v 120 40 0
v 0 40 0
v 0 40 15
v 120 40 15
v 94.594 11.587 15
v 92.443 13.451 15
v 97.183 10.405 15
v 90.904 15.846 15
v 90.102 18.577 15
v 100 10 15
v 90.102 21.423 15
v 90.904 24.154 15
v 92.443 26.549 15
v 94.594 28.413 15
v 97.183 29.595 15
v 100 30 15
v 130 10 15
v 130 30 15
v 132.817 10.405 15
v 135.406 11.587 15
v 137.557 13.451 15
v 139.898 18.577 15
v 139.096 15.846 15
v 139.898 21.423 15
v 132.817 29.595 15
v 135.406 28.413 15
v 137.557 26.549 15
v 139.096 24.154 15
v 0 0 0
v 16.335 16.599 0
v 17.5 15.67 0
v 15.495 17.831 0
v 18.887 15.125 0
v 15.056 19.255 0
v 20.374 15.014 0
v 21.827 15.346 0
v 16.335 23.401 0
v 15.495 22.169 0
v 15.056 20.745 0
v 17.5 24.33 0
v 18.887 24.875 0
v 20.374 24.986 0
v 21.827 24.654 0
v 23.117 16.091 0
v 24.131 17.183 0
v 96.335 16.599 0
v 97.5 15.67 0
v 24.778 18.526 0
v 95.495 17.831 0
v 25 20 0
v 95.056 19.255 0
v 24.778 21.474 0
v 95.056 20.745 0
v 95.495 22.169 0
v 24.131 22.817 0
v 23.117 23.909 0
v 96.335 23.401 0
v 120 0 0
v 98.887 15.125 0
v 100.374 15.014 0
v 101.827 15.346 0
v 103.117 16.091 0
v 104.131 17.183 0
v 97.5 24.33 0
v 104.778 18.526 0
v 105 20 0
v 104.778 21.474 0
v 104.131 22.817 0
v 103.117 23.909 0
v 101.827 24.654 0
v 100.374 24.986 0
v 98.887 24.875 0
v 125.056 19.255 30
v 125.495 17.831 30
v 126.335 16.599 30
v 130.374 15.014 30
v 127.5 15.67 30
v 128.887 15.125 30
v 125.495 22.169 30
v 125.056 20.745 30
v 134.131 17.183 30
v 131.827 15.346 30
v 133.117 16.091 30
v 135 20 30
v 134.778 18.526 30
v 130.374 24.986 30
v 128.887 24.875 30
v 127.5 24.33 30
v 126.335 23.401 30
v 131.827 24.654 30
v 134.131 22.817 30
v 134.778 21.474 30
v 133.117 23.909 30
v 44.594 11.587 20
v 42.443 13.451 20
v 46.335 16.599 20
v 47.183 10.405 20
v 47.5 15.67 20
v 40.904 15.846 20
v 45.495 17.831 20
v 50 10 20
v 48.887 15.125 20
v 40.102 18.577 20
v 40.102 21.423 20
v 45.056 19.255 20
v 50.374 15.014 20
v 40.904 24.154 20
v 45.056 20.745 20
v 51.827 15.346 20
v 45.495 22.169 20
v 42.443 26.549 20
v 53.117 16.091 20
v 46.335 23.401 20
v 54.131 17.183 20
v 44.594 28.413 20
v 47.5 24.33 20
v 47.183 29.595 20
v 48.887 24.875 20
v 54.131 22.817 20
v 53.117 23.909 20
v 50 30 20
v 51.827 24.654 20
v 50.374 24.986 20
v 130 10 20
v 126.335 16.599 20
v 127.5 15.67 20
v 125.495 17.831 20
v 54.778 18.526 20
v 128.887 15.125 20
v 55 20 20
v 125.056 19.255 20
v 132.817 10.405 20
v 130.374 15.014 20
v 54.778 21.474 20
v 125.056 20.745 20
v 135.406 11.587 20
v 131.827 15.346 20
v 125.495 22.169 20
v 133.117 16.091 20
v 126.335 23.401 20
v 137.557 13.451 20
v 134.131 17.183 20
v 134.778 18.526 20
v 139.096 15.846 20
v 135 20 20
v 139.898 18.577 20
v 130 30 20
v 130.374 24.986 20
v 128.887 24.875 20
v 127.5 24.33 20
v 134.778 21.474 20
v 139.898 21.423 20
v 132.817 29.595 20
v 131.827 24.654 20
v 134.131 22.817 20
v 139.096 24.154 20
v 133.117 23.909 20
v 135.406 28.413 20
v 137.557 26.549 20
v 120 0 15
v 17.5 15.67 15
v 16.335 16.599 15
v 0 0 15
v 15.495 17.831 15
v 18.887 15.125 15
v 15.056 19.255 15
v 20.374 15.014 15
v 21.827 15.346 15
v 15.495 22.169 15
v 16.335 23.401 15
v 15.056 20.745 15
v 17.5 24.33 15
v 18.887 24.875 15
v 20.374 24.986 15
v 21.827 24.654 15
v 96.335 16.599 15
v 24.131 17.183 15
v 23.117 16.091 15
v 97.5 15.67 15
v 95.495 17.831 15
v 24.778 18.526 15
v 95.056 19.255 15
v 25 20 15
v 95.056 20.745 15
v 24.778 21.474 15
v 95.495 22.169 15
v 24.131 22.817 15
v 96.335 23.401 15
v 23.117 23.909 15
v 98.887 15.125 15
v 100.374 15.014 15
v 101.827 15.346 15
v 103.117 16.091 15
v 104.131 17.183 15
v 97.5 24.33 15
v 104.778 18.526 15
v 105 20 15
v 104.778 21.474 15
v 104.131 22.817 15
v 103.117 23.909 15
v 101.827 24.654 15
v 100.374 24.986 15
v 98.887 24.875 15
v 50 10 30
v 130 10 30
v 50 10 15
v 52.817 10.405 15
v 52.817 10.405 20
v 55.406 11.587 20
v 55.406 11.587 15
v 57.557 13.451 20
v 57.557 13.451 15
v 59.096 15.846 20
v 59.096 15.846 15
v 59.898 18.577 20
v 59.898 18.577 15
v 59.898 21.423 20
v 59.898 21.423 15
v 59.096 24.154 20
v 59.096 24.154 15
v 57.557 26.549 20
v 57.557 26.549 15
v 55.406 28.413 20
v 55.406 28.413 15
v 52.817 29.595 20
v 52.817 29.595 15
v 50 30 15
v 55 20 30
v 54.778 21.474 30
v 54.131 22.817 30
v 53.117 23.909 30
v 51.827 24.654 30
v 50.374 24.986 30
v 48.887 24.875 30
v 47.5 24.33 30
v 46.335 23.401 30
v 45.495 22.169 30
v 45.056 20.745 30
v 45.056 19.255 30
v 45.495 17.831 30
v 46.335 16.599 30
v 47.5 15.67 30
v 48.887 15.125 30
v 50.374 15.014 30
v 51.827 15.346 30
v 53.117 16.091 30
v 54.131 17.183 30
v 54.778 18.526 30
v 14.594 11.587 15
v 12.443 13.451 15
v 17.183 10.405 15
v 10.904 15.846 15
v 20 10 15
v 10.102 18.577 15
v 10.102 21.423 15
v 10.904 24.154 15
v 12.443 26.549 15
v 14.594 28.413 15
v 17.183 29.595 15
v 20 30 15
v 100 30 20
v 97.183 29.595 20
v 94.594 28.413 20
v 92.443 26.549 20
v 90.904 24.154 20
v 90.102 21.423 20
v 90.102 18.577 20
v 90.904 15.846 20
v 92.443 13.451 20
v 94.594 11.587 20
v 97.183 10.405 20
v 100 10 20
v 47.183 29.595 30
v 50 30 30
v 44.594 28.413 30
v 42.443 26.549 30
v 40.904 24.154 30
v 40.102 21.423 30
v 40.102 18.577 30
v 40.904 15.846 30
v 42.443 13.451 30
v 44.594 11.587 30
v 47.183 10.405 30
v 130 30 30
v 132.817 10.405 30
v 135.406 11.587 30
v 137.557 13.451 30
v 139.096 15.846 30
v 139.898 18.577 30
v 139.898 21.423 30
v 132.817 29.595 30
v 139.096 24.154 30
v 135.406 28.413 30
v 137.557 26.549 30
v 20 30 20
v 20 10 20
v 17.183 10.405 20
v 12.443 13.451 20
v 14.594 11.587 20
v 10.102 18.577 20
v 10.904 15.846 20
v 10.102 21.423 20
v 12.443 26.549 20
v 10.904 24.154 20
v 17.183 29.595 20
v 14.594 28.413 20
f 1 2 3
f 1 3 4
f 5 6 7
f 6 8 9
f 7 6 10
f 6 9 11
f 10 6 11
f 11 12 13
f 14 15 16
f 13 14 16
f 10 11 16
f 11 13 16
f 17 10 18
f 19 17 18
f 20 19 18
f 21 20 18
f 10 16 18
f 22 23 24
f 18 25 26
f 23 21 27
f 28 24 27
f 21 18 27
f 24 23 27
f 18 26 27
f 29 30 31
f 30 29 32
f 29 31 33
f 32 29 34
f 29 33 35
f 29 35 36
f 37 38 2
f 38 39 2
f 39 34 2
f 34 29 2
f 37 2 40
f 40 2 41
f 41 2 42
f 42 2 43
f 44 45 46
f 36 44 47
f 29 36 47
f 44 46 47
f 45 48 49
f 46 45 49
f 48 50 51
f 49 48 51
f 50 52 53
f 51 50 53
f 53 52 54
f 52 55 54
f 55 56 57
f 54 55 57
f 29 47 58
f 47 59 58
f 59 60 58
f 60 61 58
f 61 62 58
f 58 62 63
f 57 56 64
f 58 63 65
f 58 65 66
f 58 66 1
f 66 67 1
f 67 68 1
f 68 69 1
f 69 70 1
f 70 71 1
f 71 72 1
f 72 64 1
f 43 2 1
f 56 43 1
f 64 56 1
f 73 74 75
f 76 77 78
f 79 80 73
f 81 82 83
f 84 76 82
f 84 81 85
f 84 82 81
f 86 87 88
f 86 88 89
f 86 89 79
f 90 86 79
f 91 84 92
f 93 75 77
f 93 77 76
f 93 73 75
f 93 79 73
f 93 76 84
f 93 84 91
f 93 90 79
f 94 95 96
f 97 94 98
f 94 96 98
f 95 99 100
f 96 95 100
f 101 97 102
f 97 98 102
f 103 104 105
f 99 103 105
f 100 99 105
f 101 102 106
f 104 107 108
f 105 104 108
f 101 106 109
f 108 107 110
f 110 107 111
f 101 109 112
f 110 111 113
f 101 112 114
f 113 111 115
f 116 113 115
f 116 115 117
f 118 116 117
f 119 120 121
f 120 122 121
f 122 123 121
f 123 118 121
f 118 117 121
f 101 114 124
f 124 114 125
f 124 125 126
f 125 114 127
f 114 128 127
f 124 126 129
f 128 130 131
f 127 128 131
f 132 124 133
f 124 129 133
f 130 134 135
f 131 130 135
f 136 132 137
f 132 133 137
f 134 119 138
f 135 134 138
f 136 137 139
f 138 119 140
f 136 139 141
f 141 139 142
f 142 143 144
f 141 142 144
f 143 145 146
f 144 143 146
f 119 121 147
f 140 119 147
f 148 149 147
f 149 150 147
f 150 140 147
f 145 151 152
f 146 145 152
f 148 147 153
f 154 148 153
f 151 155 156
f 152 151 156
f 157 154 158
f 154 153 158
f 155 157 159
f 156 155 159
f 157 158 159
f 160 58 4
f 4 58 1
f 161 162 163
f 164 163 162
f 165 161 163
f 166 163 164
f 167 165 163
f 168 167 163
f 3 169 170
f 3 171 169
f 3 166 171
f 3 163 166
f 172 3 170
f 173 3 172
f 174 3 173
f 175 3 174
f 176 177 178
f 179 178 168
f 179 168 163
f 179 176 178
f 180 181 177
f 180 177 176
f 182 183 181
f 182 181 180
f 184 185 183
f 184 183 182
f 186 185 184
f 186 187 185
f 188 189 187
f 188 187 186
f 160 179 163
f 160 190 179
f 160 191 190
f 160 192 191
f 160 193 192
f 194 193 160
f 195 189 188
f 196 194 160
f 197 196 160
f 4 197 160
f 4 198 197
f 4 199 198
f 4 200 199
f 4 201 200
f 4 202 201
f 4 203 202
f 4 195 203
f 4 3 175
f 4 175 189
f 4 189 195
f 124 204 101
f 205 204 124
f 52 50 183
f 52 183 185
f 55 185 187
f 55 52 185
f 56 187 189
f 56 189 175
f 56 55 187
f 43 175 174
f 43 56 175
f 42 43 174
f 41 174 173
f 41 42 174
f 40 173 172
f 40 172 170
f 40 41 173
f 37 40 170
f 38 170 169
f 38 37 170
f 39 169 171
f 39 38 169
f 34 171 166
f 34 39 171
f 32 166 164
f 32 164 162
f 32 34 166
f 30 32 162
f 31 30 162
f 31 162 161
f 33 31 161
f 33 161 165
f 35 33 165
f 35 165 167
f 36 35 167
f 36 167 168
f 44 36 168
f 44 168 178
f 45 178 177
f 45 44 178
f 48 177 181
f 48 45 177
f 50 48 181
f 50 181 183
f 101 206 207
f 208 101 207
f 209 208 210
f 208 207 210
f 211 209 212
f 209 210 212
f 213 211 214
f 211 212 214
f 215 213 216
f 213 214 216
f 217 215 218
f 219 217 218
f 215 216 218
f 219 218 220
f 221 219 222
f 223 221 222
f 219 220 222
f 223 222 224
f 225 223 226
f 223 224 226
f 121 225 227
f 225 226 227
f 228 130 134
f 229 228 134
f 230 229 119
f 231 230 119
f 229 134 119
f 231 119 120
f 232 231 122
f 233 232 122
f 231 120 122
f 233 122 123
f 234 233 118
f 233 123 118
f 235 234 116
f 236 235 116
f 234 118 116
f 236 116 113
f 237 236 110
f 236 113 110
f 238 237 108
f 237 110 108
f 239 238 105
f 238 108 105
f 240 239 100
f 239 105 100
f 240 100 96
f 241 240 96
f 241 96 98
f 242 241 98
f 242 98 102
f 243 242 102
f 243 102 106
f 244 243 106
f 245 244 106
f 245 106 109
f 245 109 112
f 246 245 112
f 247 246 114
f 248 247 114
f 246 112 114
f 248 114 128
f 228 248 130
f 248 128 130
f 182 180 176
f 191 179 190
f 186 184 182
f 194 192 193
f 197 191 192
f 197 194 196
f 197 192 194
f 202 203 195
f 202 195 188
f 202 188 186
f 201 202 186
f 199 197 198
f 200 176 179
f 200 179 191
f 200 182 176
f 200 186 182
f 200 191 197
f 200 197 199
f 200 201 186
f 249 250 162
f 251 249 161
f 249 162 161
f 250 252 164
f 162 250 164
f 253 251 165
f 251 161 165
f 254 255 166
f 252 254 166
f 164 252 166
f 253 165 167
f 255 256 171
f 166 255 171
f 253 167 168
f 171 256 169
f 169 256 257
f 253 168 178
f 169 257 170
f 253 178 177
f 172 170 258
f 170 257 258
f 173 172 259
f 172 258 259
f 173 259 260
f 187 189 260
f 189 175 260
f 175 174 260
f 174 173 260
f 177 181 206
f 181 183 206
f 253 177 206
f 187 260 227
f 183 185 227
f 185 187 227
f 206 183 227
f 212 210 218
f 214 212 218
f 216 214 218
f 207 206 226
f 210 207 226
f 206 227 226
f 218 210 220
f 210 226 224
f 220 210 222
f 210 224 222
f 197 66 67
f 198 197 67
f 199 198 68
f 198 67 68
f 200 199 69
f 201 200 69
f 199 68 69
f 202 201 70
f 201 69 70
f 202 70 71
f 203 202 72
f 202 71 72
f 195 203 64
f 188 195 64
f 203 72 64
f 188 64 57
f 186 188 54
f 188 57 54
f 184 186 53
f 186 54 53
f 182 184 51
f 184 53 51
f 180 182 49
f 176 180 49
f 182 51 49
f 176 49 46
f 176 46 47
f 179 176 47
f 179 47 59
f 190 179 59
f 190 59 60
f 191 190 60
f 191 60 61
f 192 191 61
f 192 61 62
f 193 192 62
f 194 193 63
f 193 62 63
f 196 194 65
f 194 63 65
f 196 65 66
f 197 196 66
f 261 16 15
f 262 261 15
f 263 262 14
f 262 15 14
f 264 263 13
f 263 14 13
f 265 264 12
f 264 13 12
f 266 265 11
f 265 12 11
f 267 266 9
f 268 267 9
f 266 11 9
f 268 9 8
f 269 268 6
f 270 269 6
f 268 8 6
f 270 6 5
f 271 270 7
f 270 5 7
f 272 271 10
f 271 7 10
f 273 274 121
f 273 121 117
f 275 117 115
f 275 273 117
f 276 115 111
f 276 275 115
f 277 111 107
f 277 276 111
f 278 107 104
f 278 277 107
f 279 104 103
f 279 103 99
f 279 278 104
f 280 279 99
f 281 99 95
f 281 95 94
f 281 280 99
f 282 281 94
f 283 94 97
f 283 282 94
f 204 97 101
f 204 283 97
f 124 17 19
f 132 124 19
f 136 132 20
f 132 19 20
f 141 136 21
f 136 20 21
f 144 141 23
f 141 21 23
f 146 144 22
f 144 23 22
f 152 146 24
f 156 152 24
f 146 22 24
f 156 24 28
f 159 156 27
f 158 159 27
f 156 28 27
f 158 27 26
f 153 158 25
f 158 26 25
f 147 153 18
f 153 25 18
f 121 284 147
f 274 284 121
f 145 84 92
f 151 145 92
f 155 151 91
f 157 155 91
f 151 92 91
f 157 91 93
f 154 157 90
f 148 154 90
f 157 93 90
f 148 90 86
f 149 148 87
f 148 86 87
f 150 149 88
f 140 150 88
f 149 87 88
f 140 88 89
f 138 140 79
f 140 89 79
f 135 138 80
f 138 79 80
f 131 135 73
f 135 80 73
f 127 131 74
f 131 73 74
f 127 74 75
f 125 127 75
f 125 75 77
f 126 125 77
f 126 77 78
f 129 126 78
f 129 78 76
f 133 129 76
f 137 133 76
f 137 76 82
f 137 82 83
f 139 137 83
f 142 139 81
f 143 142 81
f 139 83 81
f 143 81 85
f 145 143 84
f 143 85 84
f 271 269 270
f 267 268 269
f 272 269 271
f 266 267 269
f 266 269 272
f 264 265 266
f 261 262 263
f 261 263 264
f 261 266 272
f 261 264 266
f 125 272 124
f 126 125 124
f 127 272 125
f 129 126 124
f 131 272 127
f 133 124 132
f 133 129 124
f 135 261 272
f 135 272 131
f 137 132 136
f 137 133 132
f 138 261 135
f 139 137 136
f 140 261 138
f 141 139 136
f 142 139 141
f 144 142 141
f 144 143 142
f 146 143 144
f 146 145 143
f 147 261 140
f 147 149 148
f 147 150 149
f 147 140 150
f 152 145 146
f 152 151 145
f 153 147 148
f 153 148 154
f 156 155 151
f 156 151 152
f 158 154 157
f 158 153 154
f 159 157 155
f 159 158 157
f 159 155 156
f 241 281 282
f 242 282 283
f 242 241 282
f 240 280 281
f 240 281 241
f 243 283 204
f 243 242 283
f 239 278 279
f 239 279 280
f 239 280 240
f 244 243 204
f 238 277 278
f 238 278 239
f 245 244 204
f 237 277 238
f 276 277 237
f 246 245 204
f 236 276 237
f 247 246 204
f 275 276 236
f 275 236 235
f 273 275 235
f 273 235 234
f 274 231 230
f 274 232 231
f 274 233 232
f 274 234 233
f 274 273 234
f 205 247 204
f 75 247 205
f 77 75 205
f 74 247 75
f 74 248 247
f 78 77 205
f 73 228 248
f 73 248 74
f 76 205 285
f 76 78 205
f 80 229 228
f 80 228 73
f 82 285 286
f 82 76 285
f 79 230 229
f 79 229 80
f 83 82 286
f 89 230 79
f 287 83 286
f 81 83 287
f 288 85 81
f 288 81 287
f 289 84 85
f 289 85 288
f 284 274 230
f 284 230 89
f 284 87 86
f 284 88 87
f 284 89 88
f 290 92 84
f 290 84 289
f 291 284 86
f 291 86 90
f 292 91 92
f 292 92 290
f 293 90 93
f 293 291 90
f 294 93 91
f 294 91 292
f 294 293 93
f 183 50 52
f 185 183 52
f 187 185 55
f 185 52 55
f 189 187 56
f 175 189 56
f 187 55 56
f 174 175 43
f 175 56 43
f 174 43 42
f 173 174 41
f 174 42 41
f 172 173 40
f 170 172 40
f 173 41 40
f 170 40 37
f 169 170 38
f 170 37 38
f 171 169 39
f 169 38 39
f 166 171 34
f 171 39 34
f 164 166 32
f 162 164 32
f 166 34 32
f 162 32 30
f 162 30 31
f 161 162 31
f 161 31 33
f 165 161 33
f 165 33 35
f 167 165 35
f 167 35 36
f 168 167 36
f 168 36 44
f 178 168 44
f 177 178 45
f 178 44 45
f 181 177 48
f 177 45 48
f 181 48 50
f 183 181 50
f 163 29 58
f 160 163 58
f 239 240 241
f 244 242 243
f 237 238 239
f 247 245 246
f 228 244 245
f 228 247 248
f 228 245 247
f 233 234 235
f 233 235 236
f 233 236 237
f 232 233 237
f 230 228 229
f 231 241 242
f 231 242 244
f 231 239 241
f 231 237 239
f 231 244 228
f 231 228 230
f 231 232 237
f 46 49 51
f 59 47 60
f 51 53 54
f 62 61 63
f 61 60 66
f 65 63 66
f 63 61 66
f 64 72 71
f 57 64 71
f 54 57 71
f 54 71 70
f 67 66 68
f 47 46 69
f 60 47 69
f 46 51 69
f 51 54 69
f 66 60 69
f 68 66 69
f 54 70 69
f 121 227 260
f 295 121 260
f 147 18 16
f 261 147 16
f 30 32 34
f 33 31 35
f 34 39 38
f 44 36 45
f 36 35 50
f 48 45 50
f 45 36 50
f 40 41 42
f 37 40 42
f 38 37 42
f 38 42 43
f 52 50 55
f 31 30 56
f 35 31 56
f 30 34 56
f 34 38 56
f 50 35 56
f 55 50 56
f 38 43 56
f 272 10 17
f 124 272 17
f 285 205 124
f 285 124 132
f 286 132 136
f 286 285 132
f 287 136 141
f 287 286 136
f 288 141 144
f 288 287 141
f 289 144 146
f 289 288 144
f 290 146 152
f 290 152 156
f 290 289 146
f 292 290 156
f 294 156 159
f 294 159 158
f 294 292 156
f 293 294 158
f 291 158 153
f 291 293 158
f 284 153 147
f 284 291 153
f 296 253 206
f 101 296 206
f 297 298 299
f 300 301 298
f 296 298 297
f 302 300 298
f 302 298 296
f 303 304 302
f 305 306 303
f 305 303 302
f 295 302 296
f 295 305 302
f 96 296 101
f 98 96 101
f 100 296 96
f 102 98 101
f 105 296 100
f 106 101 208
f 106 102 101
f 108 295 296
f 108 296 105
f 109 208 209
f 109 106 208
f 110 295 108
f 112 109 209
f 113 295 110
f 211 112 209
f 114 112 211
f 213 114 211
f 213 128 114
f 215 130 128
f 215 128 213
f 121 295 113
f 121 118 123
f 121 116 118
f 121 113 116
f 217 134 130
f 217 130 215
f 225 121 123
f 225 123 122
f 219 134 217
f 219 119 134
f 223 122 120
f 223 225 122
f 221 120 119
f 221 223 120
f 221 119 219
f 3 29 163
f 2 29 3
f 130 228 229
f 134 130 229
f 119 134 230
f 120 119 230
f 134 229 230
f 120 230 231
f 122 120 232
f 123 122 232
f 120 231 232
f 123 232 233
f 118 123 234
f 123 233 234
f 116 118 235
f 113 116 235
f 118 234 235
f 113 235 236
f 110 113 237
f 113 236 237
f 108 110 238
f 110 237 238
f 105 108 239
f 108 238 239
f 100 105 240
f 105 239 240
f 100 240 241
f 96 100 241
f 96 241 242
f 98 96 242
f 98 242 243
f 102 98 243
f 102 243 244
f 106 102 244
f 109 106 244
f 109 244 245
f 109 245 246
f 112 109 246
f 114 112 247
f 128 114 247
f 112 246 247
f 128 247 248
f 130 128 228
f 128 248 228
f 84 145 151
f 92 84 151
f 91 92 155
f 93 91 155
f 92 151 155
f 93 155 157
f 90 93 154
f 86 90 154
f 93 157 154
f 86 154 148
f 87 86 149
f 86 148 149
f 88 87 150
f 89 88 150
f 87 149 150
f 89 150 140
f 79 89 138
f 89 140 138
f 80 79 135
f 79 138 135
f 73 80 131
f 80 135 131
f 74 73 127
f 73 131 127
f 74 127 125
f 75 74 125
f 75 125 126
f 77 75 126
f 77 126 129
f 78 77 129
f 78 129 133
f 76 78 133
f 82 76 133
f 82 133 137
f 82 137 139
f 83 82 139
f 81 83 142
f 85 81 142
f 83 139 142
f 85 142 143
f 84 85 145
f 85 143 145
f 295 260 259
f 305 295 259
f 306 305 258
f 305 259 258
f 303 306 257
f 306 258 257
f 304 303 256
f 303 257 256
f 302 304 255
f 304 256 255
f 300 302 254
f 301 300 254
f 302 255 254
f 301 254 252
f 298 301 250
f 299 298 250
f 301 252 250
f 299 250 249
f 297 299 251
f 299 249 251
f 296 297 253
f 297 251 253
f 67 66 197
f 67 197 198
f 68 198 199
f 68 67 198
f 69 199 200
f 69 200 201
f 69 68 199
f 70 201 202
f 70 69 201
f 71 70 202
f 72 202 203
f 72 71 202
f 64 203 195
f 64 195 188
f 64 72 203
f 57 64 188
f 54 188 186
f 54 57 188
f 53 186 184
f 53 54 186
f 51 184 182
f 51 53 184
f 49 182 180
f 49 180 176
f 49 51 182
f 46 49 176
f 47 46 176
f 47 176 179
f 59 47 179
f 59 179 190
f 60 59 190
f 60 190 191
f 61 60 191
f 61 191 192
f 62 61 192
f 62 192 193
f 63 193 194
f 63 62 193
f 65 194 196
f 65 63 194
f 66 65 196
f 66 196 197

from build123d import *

# Parameters (mm, degrees)
F0_W      = 120
F0_H      = 40
F0_R      = 5
F1_DEPTH  = 15
F4_DEPTH  = 5
F5_R      = 5
F6_DEPTH  = 10
F7_DEPTH  = 15
F8_R      = 5
F9_DEPTH  = 5
F10_R     = 5
F11_DEPTH = 10
F12_DEPTH = 15
F13_R     = 5
F14_DEPTH = 10


with BuildPart() as f1:
    # F0 (on Top) → F1 (new body)
    with BuildSketch(Plane.XY):
        with Locations((60, 20)):
            Rectangle(F0_W, F0_H)
        with Locations((20, 20)):
            Circle(F0_R, mode=Mode.SUBTRACT)
        with Locations((100, 20)):
            Circle(F0_R, mode=Mode.SUBTRACT)
    extrude(amount=F1_DEPTH)


with BuildPart() as f4:
    # F3 (on face) → F4 (new body)
    with BuildSketch(Plane.XY.offset(15)):
        with BuildLine():
            Line((20, 10), (50, 10))
            ThreePointArc((50, 10), (60, 20), (50, 30))
            Line((50, 30), (20, 30))
            ThreePointArc((20, 30), (10, 20), (20, 10))
        make_face()
    extrude(amount=F4_DEPTH)

    # F5 (on face) → F6 (join)
    with BuildSketch(Plane.XY.offset(20)):
        with Locations((50, 20)):
            Circle(F5_R)
    extrude(amount=F6_DEPTH)

    # F0 (on Top) → F7 (join, through all)
    with BuildSketch(Plane.XY):
        with Locations((20, 20)):
            Circle(F0_R)
    extrude(amount=F7_DEPTH)


with BuildPart() as f9:
    # F8 (on face) → F9 (new body)
    with BuildSketch(Plane.XY.offset(15)):
        with BuildLine():
            ThreePointArc((100, 30), (90, 20), (100, 10))
            Line((100, 10), (130, 10))
            ThreePointArc((130, 10), (140, 20), (130, 30))
            Line((130, 30), (100, 30))
        make_face()
        with Locations((100, 20)):
            Circle(F8_R, mode=Mode.SUBTRACT)
        with Locations((100, 20)):
            Circle(F8_R)
    extrude(amount=F9_DEPTH)

    # F10 (on face) → F11 (join)
    with BuildSketch(Plane.XY.offset(20)):
        with Locations((130, 20)):
            Circle(F10_R)
    extrude(amount=F11_DEPTH)


with BuildPart() as f12:
    # F0 (on Top) → F12 (new body, through all)
    with BuildSketch(Plane.XY):
        with Locations((100, 20)):
            Circle(F0_R)
    extrude(amount=F12_DEPTH)


with BuildPart() as f14:
    # F13 (on face) → F14 (new body)
    with BuildSketch(Plane.XY.offset(30)):
        with BuildLine():
            Line((130, 30), (50, 30))
            ThreePointArc((50, 30), (40, 20), (50, 10))
            Line((50, 10), (130, 10))
            ThreePointArc((130, 10), (140, 20), (130, 30))
        make_face()
        with Locations((50, 20)):
            Circle(F13_R, mode=Mode.SUBTRACT)
        with Locations((130, 20)):
            Circle(F13_R, mode=Mode.SUBTRACT)
    extrude(amount=-F14_DEPTH)


solid = Compound([f1.part, f4.part, f9.part, f12.part, f14.part])
